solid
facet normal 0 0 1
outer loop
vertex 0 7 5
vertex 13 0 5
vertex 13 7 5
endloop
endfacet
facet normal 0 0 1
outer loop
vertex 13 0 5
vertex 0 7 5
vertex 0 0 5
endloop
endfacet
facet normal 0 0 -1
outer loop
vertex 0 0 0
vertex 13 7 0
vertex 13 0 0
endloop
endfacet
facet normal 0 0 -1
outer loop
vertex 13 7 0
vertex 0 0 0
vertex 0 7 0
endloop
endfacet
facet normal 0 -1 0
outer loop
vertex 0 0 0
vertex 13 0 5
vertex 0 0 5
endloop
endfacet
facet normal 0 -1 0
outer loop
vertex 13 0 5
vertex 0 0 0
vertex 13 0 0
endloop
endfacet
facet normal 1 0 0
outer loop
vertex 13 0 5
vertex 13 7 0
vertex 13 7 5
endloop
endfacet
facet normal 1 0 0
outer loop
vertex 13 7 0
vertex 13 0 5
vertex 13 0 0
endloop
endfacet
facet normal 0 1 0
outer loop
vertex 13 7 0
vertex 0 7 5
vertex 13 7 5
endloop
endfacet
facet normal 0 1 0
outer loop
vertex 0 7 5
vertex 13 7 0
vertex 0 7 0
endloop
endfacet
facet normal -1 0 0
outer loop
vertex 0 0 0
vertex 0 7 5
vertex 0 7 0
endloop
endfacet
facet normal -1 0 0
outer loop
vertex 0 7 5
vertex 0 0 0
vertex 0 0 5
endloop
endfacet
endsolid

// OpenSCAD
// Generated by SolidPython 1.0.1 on 2020-07-29 00:46:55


cube(size = [13, 7, 5]);
/***********************************************
*********      SolidPython code:      **********
************************************************
 
# import packages: SolidPython
from solid import *
from solid.utils import *
from itertools import chain, combinations, permutations


class Resize:

    def __init__(self, scad_file):
        self.scad_file = scad_file
        #self.scad_file = import_scad(scad_file)
        # cone/cylinder param:
        self.r1 = 0
        self.r2 = 0
        self.h = 0
        # rectangular prism param:
        self.w = 0
        self.l = 0
        # ellipse param:
        self.r = 0

    # import OpenScad code (file name corresponds to shape)


    # classify shape + parameters
    def assign(self, param1, param2, param3):
        if self.scad_file == 'cone.scad':
            self.r1 = param1
            self.r2 = param2
            self.h = param3
        elif self.scad_file == 'cylinder.scad':
            self.r1 = param1
            self.r2 = param2
            self.h = param3
        elif self.scad_file == 'rectangularPrism.scad':
            self.h = param1
            self.l = param2
            self.w = param3
        else:
            self.r = param1
            self.h = param2

    # resize parameters
    def iterate(self):
        x = range(3, 20, 2)
        i = 1
        if self.scad_file == 'cone.scad':
            tempList = list(permutations(x, 2))
            for temp in tempList:
                param1 = temp[0]
                param2 = temp[1]
                filepath = 'produced_scad_files/' + 'cone' + str(param1) + '_' + str(param2) + '_' + '.scad'
                scad_render_to_file(cylinder(h=param1, r1=param2, r2=0), filepath)

        elif self.scad_file == 'cylinder.scad':
            tempList = list(permutations(x, 3))
            for temp in tempList:
                param1 = temp[0]
                param2 = temp[1]
                filepath = 'produced_scad_files/' + 'cylinder' + str(param1) + '_' + str(param2) + '_' + '.scad'
                scad_render_to_file(cylinder(h=param1, r1=param2, r2=param2), filepath)

        elif self.scad_file == 'rectangularPrism.scad':
            tempList = list(permutations(x, 3))
            for temp in tempList:
                param1 = temp[0]
                param2 = temp[1]
                param3 = temp[2]
                filepath = 'produced_scad_files/' + 'rectangularPrism' + str(param1) + '_' + str(param2) + '_' + str(
                    param3) + '.scad'
                scad_render_to_file(cube(size=(param1, param2, param3)), filepath)

        elif self.scad_file == 'ellipse.scad':
            tempList = list(permutations(x, 4))
            for temp in tempList:
                param1 = temp[0]
                param2 = temp[1]
                param3 = temp[2]
                param4 = temp[3]
                filepath = 'produced_scad_files/' + 'ellipse' + str(param1) + '_' + str(param2) + '_' + str(param3) + '_' + str(param4) + '.scad'
                scad_render_to_file(scale([param1, param2, param3])(sphere(r=param4)), filepath)

    def render_to_scadfile(self):
        scad_render_to_file(scad, 'example.scad') 
 
************************************************/
